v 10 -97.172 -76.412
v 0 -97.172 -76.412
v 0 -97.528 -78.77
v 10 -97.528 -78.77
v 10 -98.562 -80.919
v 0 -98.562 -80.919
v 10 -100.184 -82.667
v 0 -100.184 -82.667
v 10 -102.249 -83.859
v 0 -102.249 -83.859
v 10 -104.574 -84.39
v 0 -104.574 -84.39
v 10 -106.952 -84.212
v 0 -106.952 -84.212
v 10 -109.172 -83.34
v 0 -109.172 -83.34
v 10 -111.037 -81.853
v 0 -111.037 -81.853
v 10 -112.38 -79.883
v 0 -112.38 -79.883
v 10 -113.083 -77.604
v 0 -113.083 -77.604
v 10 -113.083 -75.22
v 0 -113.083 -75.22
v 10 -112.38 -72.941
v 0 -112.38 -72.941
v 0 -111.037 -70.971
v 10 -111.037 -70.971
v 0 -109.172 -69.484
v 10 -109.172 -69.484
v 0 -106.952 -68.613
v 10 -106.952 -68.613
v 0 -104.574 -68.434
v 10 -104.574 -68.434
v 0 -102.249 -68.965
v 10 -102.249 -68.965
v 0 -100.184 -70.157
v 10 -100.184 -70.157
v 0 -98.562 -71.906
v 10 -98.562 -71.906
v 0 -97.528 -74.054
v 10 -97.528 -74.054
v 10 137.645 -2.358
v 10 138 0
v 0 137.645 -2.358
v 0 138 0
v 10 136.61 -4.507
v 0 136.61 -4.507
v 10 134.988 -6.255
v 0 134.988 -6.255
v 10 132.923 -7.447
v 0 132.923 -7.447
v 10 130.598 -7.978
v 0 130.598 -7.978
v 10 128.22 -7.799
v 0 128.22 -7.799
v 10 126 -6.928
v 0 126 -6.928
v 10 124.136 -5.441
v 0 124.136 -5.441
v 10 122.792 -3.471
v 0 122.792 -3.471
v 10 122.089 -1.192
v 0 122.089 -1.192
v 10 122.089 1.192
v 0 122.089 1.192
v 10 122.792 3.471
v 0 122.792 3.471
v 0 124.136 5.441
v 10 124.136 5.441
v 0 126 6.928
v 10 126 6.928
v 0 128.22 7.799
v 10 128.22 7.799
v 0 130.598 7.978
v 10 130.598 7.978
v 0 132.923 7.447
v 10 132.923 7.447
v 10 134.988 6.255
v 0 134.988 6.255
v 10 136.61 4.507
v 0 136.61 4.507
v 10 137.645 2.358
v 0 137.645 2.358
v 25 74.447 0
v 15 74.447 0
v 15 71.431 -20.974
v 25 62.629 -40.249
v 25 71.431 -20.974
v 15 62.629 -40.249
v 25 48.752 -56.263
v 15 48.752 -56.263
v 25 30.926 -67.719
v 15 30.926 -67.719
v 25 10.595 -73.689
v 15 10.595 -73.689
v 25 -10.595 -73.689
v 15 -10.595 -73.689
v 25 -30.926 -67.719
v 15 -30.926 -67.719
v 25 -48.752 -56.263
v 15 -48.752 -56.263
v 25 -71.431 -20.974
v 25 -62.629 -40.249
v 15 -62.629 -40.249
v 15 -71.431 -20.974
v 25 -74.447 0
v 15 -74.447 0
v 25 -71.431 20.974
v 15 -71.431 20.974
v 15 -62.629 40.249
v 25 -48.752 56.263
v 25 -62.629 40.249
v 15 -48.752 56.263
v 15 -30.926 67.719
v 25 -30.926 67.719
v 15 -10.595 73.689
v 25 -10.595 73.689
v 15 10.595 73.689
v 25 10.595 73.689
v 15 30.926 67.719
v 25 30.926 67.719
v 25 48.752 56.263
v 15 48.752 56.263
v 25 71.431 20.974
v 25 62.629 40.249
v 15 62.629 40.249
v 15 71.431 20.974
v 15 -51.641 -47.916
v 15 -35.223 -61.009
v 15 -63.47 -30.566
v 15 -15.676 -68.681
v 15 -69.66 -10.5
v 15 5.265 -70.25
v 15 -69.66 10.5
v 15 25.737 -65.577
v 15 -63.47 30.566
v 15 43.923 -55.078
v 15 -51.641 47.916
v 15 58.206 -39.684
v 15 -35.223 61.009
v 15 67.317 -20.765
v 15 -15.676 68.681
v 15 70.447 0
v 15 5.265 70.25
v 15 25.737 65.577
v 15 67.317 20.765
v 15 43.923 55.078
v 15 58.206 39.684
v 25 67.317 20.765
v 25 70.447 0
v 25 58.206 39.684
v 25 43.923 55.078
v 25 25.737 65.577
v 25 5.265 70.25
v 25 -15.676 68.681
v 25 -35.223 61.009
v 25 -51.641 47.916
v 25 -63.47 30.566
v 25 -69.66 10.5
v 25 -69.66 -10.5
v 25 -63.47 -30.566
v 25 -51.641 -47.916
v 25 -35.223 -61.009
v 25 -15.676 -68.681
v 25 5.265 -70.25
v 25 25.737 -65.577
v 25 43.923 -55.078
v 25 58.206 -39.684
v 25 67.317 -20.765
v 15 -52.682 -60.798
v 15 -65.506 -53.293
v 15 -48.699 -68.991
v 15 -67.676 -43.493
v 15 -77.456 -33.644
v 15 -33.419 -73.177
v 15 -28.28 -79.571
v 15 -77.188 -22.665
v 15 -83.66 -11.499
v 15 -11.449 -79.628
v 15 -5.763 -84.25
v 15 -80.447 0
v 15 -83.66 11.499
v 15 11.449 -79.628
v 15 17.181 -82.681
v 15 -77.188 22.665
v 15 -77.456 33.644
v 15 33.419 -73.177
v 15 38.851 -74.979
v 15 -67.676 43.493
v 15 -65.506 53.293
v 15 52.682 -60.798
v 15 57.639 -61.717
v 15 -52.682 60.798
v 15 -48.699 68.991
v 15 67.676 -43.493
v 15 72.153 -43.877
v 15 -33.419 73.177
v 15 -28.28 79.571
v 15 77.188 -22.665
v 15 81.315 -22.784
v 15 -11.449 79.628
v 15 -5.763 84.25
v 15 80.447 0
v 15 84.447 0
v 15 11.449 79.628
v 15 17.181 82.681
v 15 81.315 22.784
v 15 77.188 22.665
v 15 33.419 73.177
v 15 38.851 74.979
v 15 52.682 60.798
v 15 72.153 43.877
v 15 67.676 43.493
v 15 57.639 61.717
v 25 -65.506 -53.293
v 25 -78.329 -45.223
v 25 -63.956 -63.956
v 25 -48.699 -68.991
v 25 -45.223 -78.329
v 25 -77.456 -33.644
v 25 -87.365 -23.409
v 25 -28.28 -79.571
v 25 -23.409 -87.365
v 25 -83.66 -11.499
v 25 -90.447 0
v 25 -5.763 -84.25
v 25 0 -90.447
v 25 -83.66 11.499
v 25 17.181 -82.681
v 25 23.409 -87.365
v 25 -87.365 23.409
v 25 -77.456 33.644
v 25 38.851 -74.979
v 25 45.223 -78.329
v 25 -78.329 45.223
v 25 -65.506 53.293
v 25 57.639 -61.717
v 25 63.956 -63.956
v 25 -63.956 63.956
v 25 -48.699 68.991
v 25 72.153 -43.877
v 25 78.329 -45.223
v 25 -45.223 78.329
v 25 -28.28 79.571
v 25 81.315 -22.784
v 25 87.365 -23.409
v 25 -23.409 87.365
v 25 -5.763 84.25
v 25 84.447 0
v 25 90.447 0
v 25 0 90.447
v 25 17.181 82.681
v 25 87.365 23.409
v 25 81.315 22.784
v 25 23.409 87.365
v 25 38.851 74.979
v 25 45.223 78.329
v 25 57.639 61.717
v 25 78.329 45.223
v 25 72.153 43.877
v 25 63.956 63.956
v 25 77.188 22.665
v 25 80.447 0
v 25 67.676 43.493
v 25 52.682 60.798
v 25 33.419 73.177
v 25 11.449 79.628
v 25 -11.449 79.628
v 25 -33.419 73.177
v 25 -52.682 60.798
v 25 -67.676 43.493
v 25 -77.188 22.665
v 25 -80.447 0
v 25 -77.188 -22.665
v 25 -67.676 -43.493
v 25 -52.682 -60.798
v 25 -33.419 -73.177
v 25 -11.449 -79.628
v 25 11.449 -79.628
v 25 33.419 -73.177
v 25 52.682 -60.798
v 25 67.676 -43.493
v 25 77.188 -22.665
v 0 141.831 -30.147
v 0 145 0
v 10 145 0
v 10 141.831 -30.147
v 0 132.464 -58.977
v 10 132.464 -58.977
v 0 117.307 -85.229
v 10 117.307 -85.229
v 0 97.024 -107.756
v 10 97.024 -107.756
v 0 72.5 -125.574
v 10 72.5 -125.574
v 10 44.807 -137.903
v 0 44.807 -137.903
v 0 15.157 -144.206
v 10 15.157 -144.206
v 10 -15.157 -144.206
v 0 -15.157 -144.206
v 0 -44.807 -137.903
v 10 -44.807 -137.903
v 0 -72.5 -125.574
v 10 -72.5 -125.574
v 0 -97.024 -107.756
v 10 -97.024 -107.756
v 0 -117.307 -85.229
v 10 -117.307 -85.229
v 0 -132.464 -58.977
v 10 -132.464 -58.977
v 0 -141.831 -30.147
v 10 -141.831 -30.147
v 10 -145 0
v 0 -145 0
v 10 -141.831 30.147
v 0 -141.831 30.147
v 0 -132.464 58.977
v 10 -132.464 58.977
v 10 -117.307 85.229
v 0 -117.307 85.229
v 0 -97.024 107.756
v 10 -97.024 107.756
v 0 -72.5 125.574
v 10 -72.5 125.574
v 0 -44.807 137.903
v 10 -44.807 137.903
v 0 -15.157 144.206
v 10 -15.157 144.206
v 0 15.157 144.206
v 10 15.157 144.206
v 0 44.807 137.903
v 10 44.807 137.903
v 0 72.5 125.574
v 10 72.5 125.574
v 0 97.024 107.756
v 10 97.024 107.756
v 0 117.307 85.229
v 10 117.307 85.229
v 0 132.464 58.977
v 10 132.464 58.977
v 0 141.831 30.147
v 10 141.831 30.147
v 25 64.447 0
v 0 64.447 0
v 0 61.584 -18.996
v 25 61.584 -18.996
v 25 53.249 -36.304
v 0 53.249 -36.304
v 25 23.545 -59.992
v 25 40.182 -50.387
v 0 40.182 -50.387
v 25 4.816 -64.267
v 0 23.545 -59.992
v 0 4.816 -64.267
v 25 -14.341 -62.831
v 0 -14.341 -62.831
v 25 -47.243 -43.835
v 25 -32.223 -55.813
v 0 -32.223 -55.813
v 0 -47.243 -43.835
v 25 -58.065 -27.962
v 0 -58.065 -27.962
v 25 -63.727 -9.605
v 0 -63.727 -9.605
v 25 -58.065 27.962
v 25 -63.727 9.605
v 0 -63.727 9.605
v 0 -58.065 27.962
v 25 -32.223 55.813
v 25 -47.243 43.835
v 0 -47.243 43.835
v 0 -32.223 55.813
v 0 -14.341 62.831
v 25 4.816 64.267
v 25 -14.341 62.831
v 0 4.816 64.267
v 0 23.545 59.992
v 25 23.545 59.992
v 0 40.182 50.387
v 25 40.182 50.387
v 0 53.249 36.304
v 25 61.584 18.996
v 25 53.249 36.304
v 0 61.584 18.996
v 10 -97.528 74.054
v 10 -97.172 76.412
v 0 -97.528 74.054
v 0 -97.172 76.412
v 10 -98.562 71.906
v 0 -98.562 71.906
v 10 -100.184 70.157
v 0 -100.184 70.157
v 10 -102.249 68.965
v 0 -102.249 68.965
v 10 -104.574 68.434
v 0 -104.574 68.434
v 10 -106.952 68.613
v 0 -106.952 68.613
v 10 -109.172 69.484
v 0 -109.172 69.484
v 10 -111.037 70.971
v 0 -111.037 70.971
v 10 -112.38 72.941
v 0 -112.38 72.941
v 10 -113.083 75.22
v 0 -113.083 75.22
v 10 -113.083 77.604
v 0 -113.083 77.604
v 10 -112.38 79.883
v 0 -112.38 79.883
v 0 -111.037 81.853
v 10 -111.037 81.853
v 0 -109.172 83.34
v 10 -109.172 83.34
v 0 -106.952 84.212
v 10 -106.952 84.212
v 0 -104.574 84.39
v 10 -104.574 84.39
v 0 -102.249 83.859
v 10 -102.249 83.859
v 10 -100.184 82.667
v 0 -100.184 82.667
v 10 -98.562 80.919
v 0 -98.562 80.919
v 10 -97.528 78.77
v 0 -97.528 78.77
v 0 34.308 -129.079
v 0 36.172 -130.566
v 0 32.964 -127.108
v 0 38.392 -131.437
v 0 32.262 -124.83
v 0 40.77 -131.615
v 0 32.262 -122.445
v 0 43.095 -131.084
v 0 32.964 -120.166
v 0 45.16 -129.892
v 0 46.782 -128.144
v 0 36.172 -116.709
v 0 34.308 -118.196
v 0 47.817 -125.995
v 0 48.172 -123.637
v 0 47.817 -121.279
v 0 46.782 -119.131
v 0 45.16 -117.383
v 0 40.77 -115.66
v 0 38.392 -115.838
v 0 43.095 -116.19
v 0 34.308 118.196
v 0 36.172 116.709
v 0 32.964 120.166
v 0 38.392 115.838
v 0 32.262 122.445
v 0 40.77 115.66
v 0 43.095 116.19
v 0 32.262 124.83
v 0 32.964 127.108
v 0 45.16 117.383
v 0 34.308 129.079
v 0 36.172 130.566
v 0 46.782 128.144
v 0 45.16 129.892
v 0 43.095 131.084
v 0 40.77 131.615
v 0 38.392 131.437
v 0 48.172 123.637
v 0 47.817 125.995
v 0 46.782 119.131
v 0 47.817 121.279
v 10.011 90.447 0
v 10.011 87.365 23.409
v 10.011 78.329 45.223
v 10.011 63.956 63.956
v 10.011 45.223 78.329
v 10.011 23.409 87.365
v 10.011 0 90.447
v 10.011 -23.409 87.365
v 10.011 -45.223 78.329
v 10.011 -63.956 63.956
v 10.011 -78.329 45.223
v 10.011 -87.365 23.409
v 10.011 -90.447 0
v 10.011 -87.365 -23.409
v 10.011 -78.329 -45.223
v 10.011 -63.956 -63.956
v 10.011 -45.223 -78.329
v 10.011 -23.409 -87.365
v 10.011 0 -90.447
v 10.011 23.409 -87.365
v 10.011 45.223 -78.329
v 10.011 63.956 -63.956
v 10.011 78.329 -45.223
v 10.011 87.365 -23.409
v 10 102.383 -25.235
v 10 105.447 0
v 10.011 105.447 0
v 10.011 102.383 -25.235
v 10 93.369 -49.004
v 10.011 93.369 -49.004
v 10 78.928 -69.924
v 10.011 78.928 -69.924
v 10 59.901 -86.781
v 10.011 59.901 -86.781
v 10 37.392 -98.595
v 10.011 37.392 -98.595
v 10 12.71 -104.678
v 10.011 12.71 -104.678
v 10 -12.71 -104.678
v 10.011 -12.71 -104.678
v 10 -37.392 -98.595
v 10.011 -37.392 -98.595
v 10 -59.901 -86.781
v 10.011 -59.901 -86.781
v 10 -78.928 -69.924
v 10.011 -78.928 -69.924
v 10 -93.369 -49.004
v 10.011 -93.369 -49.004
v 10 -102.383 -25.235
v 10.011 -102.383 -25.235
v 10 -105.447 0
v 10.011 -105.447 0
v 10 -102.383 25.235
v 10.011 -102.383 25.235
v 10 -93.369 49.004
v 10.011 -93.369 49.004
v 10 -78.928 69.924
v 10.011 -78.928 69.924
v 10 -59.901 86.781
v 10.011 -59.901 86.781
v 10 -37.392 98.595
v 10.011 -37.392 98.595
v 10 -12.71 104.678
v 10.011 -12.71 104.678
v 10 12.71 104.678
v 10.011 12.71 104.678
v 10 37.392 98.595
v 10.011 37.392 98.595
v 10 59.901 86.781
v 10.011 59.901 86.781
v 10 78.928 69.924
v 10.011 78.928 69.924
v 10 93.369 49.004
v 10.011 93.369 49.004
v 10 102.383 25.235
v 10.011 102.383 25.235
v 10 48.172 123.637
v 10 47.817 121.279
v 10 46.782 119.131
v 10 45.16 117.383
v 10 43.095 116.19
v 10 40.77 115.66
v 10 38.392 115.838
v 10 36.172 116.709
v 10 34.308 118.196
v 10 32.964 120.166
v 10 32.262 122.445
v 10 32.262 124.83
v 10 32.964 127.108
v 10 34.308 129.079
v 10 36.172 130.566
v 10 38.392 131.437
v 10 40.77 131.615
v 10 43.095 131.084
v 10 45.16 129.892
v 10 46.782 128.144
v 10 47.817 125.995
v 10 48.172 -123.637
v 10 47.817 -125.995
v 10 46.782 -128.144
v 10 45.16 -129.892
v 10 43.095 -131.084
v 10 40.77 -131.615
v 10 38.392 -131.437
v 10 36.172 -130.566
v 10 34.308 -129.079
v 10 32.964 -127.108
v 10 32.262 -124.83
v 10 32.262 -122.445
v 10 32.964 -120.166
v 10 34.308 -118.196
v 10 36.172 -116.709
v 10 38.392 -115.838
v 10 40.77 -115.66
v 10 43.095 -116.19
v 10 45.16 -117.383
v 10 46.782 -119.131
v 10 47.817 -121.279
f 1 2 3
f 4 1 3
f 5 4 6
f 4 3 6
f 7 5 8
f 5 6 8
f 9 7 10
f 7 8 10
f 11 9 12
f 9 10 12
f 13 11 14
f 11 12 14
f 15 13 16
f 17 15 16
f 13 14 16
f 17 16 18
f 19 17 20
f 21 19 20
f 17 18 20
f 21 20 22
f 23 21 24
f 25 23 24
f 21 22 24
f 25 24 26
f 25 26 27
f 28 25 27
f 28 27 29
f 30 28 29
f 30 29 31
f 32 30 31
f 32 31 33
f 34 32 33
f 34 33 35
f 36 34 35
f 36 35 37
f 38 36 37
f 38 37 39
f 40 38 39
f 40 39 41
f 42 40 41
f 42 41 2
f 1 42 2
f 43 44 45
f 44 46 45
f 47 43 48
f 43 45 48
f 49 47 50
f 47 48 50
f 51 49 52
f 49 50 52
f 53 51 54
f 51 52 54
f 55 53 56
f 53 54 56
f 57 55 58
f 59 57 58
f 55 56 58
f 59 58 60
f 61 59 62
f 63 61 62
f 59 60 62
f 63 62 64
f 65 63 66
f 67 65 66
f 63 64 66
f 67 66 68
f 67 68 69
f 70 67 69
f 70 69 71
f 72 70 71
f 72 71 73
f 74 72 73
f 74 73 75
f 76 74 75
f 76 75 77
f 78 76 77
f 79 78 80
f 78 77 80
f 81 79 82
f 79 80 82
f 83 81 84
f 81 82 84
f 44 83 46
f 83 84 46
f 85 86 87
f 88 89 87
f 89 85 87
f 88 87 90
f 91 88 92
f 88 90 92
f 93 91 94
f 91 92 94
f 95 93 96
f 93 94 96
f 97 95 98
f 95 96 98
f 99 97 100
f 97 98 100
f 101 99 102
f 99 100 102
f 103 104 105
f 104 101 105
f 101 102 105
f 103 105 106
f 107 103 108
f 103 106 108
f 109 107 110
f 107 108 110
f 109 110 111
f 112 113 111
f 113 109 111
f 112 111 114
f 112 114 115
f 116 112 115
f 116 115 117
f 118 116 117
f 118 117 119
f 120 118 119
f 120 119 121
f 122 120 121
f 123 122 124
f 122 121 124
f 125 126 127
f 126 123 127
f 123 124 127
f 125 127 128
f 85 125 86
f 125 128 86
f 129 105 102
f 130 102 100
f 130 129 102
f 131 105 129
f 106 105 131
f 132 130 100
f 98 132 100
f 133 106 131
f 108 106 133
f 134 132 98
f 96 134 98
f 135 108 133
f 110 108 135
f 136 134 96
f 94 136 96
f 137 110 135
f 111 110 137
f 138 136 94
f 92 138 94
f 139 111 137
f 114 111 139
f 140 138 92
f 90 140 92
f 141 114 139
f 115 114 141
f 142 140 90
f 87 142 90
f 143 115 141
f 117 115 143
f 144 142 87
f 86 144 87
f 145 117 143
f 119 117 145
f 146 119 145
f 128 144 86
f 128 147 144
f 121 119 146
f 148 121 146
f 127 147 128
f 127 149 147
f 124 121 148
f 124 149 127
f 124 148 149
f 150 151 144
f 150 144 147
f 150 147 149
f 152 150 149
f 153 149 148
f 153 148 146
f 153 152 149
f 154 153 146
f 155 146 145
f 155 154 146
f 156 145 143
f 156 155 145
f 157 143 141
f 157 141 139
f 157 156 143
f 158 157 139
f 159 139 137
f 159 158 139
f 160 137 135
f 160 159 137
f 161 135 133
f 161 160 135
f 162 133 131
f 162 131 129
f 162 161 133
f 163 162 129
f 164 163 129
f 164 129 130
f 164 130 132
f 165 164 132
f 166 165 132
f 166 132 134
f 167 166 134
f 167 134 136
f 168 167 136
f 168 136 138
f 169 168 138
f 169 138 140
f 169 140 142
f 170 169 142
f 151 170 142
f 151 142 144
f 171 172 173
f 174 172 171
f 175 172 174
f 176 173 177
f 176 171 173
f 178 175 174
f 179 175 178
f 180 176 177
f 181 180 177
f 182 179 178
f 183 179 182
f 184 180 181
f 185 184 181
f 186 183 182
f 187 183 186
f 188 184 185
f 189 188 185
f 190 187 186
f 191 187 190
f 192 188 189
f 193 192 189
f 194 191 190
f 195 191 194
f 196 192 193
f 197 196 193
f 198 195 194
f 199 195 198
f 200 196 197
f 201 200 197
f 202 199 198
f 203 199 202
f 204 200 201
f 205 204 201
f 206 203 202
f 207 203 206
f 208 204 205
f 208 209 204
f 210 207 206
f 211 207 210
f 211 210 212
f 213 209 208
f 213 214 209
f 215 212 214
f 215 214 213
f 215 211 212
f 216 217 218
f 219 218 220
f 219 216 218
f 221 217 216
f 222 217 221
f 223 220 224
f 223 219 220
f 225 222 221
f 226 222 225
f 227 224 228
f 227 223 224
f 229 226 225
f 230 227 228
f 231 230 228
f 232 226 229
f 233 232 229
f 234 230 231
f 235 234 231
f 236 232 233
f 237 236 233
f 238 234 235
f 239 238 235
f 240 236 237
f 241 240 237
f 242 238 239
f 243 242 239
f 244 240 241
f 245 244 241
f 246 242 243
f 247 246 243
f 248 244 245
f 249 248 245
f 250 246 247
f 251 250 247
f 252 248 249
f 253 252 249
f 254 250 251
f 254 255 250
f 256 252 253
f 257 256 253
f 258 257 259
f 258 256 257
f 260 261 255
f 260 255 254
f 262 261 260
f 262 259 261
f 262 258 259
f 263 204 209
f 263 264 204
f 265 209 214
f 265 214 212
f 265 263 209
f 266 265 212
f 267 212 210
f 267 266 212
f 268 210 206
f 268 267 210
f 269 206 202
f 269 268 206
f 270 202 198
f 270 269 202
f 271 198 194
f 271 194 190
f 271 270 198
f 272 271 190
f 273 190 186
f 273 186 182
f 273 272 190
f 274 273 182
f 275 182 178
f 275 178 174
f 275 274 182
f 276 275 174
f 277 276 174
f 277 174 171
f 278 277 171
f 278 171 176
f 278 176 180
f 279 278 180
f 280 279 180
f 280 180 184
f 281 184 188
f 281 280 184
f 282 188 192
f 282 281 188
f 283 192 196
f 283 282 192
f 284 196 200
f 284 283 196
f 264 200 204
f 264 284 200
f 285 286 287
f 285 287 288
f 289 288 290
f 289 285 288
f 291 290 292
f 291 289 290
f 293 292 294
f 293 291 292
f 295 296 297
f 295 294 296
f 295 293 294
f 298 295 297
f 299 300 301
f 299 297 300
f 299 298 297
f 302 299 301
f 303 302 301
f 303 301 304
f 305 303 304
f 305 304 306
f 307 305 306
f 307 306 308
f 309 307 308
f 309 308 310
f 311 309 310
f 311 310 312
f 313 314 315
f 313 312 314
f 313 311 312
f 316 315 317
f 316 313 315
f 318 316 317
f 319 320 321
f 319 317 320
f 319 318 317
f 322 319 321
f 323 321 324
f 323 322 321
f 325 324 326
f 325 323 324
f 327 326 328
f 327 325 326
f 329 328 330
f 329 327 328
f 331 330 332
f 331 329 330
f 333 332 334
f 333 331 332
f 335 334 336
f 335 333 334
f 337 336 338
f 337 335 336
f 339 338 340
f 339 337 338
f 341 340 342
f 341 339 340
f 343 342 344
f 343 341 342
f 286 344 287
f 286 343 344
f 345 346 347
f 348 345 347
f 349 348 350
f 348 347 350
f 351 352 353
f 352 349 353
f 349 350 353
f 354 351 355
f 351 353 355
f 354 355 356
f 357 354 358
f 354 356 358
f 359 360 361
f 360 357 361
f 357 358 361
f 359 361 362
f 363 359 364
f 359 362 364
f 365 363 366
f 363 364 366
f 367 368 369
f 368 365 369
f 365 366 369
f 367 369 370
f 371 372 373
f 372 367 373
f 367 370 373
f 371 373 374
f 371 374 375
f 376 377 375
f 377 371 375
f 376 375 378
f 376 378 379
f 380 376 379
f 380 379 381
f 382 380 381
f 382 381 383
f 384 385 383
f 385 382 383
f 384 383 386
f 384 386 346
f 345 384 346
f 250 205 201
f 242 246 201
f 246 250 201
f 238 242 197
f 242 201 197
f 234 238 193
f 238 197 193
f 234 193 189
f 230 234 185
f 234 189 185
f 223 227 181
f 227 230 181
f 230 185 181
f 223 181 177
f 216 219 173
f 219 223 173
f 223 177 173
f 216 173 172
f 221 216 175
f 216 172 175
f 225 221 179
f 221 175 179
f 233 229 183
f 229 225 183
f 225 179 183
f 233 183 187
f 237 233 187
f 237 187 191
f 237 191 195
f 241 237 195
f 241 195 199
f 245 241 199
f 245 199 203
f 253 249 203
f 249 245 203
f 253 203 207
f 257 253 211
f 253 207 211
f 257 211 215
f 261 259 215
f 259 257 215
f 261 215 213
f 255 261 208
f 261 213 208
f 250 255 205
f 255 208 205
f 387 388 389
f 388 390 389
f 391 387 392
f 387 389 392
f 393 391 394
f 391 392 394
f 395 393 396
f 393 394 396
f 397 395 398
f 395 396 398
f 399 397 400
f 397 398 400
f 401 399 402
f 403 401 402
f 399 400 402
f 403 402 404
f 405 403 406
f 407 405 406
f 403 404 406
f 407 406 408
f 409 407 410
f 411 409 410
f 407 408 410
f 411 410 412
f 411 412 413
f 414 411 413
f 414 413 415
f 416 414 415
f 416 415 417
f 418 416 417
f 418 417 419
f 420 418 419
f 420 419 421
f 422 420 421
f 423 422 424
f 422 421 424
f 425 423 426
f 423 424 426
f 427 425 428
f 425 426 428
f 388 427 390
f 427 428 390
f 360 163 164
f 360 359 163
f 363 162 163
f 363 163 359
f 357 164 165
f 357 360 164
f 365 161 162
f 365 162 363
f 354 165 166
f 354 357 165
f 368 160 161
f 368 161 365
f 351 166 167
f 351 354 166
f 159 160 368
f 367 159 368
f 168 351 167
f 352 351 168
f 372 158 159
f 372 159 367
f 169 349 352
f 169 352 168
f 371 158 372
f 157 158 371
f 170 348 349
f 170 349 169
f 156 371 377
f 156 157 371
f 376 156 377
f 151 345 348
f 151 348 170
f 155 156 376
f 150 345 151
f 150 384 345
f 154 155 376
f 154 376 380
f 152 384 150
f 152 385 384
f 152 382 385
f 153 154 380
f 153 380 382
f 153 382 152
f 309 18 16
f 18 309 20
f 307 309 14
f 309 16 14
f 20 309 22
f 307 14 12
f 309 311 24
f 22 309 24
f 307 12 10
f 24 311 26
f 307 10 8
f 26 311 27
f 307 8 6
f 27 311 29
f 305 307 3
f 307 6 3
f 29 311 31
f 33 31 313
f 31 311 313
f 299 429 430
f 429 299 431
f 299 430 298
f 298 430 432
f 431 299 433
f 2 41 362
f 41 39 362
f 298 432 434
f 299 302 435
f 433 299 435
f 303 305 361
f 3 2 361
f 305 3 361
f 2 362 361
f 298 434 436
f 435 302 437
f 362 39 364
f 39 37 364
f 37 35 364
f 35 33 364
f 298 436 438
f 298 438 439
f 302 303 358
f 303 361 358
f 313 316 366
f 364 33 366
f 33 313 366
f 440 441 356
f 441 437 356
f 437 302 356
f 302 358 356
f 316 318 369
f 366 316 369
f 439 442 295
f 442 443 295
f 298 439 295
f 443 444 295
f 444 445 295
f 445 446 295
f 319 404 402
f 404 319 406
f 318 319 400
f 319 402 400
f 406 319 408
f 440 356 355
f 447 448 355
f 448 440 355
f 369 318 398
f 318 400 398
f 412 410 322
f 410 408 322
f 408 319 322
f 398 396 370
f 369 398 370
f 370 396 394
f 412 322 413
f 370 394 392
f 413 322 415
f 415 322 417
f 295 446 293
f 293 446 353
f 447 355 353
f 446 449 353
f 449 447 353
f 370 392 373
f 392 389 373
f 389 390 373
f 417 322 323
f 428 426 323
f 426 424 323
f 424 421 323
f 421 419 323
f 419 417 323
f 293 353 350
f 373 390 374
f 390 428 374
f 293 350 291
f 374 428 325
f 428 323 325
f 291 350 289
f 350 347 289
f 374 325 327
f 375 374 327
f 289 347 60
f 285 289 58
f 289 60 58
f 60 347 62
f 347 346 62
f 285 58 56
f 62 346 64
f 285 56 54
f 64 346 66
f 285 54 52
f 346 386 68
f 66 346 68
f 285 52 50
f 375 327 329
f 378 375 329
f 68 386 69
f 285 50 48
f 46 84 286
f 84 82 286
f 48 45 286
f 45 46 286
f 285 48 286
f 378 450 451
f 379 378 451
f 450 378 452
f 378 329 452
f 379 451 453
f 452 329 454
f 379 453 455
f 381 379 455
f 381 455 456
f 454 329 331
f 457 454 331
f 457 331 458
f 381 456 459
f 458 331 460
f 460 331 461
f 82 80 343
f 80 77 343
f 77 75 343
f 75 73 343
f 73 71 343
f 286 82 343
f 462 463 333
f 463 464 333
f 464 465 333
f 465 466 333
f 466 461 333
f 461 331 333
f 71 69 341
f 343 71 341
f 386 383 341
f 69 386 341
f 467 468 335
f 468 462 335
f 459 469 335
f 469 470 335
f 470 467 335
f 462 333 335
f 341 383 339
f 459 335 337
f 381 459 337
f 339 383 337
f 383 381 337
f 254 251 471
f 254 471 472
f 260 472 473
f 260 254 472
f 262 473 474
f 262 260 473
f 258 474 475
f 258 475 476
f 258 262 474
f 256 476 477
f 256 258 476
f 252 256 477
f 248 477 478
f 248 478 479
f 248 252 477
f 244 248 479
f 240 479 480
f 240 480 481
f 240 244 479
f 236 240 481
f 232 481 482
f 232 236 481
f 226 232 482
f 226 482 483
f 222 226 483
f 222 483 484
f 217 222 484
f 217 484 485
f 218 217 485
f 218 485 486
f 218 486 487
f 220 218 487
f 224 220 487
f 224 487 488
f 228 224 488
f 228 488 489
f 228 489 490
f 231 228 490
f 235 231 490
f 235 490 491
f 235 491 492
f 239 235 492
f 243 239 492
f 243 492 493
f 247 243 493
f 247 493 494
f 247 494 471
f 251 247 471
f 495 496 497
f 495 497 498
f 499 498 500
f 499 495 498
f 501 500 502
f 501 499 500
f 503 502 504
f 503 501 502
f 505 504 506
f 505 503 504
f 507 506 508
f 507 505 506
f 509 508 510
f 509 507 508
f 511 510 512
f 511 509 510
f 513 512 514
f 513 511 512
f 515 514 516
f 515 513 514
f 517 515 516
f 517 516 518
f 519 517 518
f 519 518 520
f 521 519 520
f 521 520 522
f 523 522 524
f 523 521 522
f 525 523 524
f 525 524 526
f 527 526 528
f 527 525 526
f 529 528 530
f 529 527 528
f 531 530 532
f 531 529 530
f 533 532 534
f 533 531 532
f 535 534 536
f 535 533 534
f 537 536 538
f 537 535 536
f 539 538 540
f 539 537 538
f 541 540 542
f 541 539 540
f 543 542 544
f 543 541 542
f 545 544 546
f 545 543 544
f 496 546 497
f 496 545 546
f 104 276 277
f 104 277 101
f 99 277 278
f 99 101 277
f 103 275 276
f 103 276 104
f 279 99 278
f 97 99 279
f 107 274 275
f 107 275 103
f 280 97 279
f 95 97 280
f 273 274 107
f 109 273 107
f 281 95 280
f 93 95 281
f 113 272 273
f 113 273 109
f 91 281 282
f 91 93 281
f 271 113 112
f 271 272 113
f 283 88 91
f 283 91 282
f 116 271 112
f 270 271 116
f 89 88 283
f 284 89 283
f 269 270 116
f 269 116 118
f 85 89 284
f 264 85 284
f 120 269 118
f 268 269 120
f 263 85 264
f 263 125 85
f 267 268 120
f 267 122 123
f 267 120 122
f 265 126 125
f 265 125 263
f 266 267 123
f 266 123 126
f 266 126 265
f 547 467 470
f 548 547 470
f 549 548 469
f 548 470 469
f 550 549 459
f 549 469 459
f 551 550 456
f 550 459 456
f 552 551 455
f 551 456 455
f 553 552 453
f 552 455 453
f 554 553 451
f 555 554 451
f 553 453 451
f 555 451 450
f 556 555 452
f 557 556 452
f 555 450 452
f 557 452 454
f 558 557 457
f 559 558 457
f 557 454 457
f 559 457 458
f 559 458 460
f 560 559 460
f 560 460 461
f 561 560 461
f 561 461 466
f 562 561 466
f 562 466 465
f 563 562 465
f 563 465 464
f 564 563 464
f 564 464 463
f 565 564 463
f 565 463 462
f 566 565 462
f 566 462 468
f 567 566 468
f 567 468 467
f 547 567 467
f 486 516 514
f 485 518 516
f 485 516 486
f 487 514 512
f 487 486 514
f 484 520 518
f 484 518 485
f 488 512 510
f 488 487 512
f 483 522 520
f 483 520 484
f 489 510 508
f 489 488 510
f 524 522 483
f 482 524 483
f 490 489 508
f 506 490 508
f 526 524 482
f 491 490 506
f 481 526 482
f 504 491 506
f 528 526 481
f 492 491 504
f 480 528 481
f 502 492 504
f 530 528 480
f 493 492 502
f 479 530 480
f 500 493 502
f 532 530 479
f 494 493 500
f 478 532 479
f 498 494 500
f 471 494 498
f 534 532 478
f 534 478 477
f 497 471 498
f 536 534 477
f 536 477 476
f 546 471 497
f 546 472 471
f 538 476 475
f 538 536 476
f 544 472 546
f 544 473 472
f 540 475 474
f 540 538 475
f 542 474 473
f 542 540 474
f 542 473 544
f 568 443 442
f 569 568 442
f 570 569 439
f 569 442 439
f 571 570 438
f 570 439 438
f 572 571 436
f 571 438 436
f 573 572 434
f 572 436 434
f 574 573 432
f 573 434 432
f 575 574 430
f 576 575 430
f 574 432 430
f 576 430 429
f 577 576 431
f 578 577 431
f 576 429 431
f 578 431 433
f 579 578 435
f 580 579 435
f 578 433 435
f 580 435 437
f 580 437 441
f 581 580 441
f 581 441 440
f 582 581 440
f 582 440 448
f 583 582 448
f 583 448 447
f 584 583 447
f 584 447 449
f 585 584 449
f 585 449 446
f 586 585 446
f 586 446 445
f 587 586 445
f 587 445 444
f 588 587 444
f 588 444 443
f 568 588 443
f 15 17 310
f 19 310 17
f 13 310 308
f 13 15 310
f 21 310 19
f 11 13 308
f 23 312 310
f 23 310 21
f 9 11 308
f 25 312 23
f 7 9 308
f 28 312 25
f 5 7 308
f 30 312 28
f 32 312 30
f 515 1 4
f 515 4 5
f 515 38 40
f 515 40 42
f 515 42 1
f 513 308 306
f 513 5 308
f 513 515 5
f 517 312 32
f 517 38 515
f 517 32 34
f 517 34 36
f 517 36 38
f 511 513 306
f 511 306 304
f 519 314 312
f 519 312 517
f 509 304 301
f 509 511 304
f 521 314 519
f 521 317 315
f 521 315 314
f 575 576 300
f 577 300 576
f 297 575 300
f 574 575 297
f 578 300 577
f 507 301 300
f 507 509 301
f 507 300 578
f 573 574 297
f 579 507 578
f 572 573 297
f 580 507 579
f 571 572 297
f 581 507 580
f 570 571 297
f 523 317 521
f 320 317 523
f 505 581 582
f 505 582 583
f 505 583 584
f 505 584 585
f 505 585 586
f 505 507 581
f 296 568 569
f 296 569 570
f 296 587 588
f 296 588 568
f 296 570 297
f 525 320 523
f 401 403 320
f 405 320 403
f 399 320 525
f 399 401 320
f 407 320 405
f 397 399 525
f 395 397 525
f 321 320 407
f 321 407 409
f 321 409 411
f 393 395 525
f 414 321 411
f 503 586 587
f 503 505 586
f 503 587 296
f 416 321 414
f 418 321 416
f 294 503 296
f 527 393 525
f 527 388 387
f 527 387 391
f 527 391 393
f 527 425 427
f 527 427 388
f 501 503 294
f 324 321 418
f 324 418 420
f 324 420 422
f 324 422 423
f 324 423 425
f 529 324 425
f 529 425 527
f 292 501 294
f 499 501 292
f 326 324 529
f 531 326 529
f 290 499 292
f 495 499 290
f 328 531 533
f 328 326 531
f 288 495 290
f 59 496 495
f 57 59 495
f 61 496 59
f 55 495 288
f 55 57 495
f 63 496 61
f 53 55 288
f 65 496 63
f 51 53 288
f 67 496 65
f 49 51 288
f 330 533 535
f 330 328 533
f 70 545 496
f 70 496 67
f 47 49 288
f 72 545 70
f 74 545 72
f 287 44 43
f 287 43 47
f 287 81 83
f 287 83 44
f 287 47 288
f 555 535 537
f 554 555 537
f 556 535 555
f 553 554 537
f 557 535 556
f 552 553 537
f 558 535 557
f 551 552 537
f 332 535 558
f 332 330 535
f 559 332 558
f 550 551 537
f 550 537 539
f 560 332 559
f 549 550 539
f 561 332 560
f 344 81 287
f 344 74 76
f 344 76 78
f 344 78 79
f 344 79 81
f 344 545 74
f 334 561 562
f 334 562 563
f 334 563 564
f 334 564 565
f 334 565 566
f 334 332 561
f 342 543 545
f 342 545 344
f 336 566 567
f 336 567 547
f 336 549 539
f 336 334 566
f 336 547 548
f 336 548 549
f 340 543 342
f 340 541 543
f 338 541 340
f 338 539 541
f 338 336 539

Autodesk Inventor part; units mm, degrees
ref_plane "YZ Plane" through (0, 0, 0) normal (1, 0, 0) x (0, 1, 0)
ref_plane "XZ Plane" through (0, 0, 0) normal (0, 1, 0) x (-1, 0, 0)
ref_plane "XY Plane" through (0, 0, 0) normal (0, 0, 1) x (1, 0, 0)
sketch "Sketch1" plane through (0, 0, 0) normal (1, 0, 0) x (0, 1, 0)
  circle A0 centre (0, 0) radius 145
  circle A1 centre (0, 0) radius 115
  circle A2 centre (0, 0) radius 130
  circle A3 centre (130, 0) radius 8
  circle A4 centre (40.1722, 123.6373) radius 8
  circle A5 centre (-105.1722, 76.4121) radius 8
  circle A6 centre (-105.1722, -76.4121) radius 8
  circle A7 centre (40.1722, -123.6373) radius 8
  dimension "d2" = 260
  dimension "d0" = 290
  dimension "d1" = 230
  dimension "d3" = 16
  dimension "d26" = 360
extrude "Extrusion1" add sketch "Sketch1" along normal blind 10 contours A0 | A3 A2 A7 A6 A5 A4
sketch "Sketch2" plane through (0, 0, 0) normal (0, 0, 1) x (1, 0, 0)
  line L0 (0, -145) -> (0, 145) projected
  line L1 (0, 115) -> (0, 115.4469)
  line L2 (0, 115.4469) -> (0, 105.4469)
  line L3 (10, -145) -> (10, 145) projected
  line L4 (10, 120.4469) -> (10, 95.4469)
  line L5 (-2, 0) -> (12, 0) projected
  line L6 (0, 105.4469) -> (0, 115)
  line L7 (10, 115) -> (10, -115) projected
  line L8 (10, 115) -> (0, 115)
  line L9 (10, 115) -> (10, 95.4469)
  line L10 (0, 95.4469) -> (0, 105.4469)
  line L11 (0, 95.4469) -> (10, 95.4469)
  point P0 (0, 0)
revolve "Revolution1" add sketch "Sketch2" angle 360 about axis through (-10, 0, 0) along (1, 0, 0) contours L0 L8 L3 L11
sketch "Sketch3" plane through (0, 0, 0) normal (0, 0, 1) x (1, 0, 0)
  line L0 (15, 90.4469) -> (25, 90.4469)
  line L1 (25, 90.4469) -> (25, 84.4469)
  line L2 (25, 84.4469) -> (15, 84.4469)
  line L3 (10.0111, 105.4469) -> (0, 105.4469)
  line L4 (0, 105.4469) -> (0, 84.4469)
  line L5 (10.0111, 105.4469) -> (0, 105.4469)
  line L6 (15, 84.4469) -> (15, 80.4469)
  line L7 (15, 80.4469) -> (25, 80.4469)
  line L8 (25, 80.4469) -> (25, 75.4469)
  line L9 (25, 75.4469) -> (25, 74.4469)
  line L10 (25, 74.4469) -> (15, 74.4469)
  line L11 (15, 74.4469) -> (15, 70.4469)
  line L12 (15, 70.4469) -> (25, 70.4469)
  line L13 (25, 70.4469) -> (25, 64.4469)
  line L14 (25, 64.4469) -> (0, 64.4469)
  line L15 (0, 64.4469) -> (0, 84.4469)
  line L16 (10.0111, 105.4469) -> (10.0111, 90.4469)
  line L17 (10.0111, 90.4469) -> (15, 90.4469)
  line L18 (-5, 0) -> (30, 0) projected
  point P0 (0, 0)
revolve "Revolution2" add sketch "Sketch3" angle 360 about axis through (-10, 0, 0) along (1, 0, 0)
thread "Thread7" size "M16x2" class "6H" standard "ANSI Metric M Profile" full length
thread "Thread8" size "M16x2" class "6H" standard "ANSI Metric M Profile" full length
thread "Thread9" size "M16x2" class "6H" standard "ANSI Metric M Profile" full length
thread "Thread10" size "M16x2" class "6H" standard "ANSI Metric M Profile" full length
thread "Thread11" size "M16x2" class "6H" standard "ANSI Metric M Profile" full length
properties part number "LABYRINTHOSeisodos"
